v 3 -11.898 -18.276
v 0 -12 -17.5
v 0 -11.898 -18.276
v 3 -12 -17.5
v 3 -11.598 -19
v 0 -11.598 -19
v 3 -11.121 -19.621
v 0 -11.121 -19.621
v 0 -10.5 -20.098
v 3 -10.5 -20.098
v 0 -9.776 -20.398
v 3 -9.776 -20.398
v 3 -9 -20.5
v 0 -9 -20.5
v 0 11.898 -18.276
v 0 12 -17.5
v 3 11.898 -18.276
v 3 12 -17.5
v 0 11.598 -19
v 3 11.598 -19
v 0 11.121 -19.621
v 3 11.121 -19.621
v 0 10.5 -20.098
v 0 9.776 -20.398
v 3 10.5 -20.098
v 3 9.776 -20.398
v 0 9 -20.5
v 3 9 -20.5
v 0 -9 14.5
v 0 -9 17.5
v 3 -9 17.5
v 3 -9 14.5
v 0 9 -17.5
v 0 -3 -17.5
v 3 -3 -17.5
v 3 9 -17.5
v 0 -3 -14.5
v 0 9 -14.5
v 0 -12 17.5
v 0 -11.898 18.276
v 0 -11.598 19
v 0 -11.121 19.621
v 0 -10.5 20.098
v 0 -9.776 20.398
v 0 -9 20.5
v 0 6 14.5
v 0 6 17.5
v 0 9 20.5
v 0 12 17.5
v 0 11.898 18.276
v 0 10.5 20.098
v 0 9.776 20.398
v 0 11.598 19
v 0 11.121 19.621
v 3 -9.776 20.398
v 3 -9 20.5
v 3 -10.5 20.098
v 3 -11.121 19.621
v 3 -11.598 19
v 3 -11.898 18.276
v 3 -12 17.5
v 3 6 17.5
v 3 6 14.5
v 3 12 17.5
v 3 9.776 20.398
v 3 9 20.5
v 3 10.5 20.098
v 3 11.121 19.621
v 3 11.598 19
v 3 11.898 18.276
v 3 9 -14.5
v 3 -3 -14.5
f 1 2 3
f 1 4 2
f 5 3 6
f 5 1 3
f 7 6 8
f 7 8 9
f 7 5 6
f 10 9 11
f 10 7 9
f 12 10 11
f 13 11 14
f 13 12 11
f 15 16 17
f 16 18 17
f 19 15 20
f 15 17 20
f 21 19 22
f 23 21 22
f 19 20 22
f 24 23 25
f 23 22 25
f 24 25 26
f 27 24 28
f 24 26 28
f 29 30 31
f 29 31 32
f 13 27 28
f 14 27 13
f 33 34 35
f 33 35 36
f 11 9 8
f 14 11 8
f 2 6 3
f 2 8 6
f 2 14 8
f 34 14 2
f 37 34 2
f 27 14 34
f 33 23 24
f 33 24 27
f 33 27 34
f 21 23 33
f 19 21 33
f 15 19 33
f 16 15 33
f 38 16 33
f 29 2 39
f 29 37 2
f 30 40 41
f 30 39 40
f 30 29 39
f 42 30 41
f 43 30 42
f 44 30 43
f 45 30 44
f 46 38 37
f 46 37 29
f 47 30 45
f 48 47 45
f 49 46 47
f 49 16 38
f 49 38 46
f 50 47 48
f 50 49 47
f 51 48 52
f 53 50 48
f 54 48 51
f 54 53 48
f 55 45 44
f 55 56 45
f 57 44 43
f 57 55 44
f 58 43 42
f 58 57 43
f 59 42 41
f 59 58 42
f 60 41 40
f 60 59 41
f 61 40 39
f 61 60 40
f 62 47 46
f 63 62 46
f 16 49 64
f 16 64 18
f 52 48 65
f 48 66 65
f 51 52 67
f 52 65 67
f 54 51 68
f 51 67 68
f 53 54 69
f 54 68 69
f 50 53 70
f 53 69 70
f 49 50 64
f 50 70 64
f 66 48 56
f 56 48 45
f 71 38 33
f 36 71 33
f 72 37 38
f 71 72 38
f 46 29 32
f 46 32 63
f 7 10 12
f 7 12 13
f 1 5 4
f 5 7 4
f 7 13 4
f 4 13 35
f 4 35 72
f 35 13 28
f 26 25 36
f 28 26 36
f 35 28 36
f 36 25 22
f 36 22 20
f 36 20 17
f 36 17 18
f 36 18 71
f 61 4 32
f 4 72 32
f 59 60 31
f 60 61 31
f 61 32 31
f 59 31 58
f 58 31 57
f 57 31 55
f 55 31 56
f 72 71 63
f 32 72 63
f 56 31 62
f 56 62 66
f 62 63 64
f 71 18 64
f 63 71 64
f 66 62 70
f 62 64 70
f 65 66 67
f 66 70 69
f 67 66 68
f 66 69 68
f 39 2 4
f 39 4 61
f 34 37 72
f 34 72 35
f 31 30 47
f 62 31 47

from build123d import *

# Parameters (mm, degrees)
SKETCH_2_W      = 3
SKETCH_2_H      = 15
SKETCH_2_H_2    = 12
EXTRUDE_1_DEPTH = 3
FILLET_1_R      = 3


with BuildPart() as part:
    # Sketch 2 → Extrude 1 (new body)
    with BuildSketch(Plane(origin=(0, 0, 0), x_dir=(0, 0, -1), z_dir=(1, 0, 0))):
        Polygon((-20.5, -9), (-20.5, 12), (20.5, 12), (20.5, -12), (-20.5, -12), align=None)
        with Locations((-16, -1.5)):
            Rectangle(SKETCH_2_W, SKETCH_2_H, mode=Mode.SUBTRACT)
        with Locations((16, 3)):
            Rectangle(SKETCH_2_W, SKETCH_2_H_2, mode=Mode.SUBTRACT)
    extrude(amount=EXTRUDE_1_DEPTH)

    # Fillet 1
    fillet_1_edges = [part.edges().sort_by_distance(p)[0] for p in [
        (1.5, 12, 20.5),
        (1.5, 12, -20.5),
        (1.5, -12, -20.5),
        (1.5, -12, 20.5),
    ]]
    fillet(fillet_1_edges, radius=FILLET_1_R)


solid = part.part
